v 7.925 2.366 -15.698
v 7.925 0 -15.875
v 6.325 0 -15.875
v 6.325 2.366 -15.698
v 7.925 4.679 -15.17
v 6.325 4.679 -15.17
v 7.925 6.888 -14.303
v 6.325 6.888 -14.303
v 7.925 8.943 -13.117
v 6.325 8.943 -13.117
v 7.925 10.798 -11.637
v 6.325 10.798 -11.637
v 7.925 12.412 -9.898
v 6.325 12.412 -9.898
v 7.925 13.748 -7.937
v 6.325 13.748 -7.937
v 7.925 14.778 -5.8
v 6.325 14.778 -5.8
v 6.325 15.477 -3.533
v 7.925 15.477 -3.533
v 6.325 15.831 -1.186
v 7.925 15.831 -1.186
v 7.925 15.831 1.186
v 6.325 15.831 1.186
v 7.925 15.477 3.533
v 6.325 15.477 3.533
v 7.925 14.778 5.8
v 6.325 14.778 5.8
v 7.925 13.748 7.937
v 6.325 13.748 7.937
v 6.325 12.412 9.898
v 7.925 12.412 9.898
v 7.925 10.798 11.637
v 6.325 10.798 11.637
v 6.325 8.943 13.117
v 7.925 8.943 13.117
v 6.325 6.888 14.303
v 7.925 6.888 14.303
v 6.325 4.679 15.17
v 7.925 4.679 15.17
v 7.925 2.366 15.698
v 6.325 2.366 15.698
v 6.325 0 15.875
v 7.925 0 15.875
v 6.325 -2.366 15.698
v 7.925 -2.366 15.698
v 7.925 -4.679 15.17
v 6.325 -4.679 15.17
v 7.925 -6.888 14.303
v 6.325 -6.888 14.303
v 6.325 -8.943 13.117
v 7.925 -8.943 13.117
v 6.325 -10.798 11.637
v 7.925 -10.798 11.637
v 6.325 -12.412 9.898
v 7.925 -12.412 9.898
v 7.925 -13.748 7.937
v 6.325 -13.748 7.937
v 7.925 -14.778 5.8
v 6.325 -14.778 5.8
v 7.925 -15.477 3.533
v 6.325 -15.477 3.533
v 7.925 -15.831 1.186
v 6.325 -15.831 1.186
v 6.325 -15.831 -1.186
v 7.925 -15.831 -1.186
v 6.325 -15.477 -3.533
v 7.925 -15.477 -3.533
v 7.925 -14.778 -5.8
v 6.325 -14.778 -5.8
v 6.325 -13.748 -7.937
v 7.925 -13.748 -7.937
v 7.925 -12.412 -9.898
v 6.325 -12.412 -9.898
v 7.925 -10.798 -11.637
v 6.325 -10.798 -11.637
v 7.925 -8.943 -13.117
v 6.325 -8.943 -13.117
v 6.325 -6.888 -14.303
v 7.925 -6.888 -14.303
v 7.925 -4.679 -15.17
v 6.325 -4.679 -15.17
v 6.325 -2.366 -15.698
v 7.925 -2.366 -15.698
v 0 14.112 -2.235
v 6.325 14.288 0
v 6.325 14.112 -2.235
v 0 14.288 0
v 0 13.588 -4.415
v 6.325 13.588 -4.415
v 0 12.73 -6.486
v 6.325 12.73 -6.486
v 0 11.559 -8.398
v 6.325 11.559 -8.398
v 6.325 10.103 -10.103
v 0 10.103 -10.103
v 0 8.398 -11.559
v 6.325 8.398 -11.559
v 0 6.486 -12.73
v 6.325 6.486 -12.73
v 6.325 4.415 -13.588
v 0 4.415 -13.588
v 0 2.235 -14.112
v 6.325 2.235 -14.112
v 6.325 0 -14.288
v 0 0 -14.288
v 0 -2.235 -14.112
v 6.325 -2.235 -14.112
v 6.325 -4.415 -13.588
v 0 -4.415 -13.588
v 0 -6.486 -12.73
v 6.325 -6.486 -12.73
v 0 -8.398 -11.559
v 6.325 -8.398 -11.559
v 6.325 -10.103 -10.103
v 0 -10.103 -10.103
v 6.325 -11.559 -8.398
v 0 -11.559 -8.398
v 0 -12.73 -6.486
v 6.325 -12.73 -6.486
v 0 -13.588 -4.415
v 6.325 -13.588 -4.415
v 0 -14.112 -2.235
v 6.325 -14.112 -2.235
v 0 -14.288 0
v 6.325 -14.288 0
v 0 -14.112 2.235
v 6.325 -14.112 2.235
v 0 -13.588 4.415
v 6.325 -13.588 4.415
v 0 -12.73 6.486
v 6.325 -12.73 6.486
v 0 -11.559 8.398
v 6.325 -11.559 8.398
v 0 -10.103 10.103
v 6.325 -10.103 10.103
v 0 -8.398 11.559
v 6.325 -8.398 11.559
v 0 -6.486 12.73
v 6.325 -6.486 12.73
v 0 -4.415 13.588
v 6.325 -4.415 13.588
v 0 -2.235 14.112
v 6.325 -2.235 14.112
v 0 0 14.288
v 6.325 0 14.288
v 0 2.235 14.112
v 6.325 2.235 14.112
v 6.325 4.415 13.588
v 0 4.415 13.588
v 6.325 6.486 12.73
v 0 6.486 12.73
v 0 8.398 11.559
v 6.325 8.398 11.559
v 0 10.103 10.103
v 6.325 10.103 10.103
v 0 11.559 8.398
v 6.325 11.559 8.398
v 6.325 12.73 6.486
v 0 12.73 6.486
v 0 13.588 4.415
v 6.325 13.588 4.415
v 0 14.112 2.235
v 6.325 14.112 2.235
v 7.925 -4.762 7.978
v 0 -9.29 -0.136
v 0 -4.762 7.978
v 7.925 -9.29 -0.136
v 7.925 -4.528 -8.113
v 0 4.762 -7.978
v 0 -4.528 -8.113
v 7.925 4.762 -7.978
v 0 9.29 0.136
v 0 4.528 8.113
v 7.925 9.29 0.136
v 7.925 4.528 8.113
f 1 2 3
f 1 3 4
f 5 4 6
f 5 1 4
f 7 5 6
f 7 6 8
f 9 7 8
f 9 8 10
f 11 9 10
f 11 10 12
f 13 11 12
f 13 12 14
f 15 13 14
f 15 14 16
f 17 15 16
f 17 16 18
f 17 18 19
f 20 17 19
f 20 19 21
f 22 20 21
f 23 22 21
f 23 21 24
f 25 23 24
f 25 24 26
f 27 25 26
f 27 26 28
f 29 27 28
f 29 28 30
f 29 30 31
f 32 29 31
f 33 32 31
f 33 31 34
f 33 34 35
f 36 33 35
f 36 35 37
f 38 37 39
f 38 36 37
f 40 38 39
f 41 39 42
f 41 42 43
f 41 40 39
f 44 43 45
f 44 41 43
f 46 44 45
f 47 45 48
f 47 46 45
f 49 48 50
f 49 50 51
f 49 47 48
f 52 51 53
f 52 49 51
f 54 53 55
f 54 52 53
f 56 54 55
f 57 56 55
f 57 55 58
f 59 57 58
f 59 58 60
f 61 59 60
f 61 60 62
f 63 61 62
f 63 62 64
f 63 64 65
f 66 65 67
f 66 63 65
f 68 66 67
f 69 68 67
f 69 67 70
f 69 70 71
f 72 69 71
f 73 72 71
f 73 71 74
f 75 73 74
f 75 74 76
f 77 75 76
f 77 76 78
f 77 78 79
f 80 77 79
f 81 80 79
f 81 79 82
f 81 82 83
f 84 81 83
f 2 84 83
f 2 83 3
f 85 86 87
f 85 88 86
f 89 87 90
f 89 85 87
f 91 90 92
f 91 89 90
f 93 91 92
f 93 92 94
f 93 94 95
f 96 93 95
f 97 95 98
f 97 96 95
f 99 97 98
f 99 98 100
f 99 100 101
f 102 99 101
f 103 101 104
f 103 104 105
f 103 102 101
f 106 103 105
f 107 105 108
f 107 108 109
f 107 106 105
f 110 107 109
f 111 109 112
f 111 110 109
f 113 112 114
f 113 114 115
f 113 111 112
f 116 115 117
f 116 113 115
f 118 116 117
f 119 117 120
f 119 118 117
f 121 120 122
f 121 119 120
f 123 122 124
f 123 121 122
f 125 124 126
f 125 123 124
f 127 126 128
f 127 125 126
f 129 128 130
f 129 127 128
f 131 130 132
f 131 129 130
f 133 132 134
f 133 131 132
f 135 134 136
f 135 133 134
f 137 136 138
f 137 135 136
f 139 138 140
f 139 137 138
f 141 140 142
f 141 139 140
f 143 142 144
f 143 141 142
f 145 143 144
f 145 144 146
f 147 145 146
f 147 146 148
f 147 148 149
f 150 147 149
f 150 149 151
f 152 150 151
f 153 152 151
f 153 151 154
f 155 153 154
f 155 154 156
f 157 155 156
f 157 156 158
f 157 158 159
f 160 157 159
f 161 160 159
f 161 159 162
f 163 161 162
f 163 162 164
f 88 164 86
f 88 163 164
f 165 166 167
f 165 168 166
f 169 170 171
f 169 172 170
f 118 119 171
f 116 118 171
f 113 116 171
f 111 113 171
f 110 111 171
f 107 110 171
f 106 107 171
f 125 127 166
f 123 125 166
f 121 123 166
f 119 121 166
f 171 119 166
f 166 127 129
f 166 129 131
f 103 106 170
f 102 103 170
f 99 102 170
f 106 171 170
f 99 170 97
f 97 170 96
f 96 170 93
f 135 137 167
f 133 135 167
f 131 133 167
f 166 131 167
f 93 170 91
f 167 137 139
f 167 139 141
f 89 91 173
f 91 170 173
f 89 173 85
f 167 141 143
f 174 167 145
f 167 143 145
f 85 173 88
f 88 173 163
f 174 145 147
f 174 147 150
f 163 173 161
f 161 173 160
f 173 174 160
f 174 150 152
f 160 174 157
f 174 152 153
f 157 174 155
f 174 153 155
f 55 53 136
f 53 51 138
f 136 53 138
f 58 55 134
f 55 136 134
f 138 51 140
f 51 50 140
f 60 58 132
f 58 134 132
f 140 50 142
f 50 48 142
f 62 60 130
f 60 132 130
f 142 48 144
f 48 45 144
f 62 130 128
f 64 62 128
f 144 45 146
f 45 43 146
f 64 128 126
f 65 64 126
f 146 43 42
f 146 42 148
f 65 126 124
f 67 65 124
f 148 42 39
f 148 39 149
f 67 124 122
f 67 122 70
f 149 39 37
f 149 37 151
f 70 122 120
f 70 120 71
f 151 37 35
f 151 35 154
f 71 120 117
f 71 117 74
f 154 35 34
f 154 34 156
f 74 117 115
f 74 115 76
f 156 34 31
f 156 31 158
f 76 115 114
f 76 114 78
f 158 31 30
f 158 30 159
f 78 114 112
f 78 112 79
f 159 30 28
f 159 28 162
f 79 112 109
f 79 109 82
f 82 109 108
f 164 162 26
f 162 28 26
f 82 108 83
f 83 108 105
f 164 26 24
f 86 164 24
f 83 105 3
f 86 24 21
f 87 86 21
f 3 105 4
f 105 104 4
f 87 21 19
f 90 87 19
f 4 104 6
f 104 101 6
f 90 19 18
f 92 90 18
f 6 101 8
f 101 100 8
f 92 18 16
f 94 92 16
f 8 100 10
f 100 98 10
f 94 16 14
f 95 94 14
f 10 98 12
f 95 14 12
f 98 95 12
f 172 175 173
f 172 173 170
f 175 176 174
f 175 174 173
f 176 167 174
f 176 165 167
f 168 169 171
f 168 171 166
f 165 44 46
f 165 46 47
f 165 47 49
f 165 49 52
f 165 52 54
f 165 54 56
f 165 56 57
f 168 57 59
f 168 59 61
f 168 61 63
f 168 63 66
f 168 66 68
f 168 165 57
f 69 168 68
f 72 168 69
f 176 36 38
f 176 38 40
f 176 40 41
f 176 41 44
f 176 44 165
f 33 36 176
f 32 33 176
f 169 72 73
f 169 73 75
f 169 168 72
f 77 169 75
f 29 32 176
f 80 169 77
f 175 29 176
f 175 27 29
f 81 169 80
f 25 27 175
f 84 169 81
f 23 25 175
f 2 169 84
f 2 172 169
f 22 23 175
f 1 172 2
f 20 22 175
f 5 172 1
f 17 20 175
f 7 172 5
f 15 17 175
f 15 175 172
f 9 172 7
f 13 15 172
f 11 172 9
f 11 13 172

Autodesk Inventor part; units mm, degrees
ref_plane "YZ Plane" through (0, 0, 0) normal (1, 0, 0) x (0, 1, 0)
ref_plane "XZ Plane" through (0, 0, 0) normal (0, 1, 0) x (-1, 0, 0)
ref_plane "XY Plane" through (0, 0, 0) normal (0, 0, 1) x (1, 0, 0)
sketch "Sketch1" plane through (0, 0, 0) normal (1, 0, 0) x (0, 1, 0)
  circle A0 centre (0, 0) radius 14.2875
  dimension "d0" = 28.575
extrude "Extrusion1" add sketch "Sketch1" along normal blind 7.9248
sketch "Sketch2" plane through (7.9248, 0, 0) normal (1, 0, 0) x (0, 0, -1)
  point P0 (0, 0)
sketch "Sketch3" plane through (7.9248, 0, 0) normal (1, 0, 0) x (0, 0, -1)
  point P0 (0, 0)
sketch "Sketch4" plane through (7.9248, 0, 0) normal (1, 0, 0) x (0, 0, -1)
  line L0 (7.978, 4.7625) -> (8.1134, -4.5279)
  line L1 (8.1134, -4.5279) -> (0.1355, -9.2904)
  line L2 (0.1355, -9.2904) -> (-7.978, -4.7625)
  line L3 (-7.978, -4.7625) -> (-8.1134, 4.5279)
  line L4 (-8.1134, 4.5279) -> (-0.1355, 9.2904)
  line L5 (-0.1355, 9.2904) -> (7.978, 4.7625)
  point P0 (0, 0)
  point P1 (0, 0)
  dimension "d3" = 9.525
  dimension "d4" = 18.5807
extrude "Extrusion2" cut sketch "Sketch4" against normal blind 279.4
sketch "Sketch5" plane through (7.9248, 0, 0) normal (1, 0, 0) x (0, 0, -1)
  circle A0 centre (0, 0) radius 15.875
  dimension "d7" = 31.75
extrude "Extrusion3" add sketch "Sketch5" against normal blind 1.6002
extrude "Extrusion4" cut sketch "Sketch4" against normal blind 1.6002
extrude "Extrusion5" add sketch "Sketch4" against normal blind 2.54
extrude "Extrusion6" cut sketch "Sketch4" against normal blind 2.54
properties part number "hexagon bearing"
